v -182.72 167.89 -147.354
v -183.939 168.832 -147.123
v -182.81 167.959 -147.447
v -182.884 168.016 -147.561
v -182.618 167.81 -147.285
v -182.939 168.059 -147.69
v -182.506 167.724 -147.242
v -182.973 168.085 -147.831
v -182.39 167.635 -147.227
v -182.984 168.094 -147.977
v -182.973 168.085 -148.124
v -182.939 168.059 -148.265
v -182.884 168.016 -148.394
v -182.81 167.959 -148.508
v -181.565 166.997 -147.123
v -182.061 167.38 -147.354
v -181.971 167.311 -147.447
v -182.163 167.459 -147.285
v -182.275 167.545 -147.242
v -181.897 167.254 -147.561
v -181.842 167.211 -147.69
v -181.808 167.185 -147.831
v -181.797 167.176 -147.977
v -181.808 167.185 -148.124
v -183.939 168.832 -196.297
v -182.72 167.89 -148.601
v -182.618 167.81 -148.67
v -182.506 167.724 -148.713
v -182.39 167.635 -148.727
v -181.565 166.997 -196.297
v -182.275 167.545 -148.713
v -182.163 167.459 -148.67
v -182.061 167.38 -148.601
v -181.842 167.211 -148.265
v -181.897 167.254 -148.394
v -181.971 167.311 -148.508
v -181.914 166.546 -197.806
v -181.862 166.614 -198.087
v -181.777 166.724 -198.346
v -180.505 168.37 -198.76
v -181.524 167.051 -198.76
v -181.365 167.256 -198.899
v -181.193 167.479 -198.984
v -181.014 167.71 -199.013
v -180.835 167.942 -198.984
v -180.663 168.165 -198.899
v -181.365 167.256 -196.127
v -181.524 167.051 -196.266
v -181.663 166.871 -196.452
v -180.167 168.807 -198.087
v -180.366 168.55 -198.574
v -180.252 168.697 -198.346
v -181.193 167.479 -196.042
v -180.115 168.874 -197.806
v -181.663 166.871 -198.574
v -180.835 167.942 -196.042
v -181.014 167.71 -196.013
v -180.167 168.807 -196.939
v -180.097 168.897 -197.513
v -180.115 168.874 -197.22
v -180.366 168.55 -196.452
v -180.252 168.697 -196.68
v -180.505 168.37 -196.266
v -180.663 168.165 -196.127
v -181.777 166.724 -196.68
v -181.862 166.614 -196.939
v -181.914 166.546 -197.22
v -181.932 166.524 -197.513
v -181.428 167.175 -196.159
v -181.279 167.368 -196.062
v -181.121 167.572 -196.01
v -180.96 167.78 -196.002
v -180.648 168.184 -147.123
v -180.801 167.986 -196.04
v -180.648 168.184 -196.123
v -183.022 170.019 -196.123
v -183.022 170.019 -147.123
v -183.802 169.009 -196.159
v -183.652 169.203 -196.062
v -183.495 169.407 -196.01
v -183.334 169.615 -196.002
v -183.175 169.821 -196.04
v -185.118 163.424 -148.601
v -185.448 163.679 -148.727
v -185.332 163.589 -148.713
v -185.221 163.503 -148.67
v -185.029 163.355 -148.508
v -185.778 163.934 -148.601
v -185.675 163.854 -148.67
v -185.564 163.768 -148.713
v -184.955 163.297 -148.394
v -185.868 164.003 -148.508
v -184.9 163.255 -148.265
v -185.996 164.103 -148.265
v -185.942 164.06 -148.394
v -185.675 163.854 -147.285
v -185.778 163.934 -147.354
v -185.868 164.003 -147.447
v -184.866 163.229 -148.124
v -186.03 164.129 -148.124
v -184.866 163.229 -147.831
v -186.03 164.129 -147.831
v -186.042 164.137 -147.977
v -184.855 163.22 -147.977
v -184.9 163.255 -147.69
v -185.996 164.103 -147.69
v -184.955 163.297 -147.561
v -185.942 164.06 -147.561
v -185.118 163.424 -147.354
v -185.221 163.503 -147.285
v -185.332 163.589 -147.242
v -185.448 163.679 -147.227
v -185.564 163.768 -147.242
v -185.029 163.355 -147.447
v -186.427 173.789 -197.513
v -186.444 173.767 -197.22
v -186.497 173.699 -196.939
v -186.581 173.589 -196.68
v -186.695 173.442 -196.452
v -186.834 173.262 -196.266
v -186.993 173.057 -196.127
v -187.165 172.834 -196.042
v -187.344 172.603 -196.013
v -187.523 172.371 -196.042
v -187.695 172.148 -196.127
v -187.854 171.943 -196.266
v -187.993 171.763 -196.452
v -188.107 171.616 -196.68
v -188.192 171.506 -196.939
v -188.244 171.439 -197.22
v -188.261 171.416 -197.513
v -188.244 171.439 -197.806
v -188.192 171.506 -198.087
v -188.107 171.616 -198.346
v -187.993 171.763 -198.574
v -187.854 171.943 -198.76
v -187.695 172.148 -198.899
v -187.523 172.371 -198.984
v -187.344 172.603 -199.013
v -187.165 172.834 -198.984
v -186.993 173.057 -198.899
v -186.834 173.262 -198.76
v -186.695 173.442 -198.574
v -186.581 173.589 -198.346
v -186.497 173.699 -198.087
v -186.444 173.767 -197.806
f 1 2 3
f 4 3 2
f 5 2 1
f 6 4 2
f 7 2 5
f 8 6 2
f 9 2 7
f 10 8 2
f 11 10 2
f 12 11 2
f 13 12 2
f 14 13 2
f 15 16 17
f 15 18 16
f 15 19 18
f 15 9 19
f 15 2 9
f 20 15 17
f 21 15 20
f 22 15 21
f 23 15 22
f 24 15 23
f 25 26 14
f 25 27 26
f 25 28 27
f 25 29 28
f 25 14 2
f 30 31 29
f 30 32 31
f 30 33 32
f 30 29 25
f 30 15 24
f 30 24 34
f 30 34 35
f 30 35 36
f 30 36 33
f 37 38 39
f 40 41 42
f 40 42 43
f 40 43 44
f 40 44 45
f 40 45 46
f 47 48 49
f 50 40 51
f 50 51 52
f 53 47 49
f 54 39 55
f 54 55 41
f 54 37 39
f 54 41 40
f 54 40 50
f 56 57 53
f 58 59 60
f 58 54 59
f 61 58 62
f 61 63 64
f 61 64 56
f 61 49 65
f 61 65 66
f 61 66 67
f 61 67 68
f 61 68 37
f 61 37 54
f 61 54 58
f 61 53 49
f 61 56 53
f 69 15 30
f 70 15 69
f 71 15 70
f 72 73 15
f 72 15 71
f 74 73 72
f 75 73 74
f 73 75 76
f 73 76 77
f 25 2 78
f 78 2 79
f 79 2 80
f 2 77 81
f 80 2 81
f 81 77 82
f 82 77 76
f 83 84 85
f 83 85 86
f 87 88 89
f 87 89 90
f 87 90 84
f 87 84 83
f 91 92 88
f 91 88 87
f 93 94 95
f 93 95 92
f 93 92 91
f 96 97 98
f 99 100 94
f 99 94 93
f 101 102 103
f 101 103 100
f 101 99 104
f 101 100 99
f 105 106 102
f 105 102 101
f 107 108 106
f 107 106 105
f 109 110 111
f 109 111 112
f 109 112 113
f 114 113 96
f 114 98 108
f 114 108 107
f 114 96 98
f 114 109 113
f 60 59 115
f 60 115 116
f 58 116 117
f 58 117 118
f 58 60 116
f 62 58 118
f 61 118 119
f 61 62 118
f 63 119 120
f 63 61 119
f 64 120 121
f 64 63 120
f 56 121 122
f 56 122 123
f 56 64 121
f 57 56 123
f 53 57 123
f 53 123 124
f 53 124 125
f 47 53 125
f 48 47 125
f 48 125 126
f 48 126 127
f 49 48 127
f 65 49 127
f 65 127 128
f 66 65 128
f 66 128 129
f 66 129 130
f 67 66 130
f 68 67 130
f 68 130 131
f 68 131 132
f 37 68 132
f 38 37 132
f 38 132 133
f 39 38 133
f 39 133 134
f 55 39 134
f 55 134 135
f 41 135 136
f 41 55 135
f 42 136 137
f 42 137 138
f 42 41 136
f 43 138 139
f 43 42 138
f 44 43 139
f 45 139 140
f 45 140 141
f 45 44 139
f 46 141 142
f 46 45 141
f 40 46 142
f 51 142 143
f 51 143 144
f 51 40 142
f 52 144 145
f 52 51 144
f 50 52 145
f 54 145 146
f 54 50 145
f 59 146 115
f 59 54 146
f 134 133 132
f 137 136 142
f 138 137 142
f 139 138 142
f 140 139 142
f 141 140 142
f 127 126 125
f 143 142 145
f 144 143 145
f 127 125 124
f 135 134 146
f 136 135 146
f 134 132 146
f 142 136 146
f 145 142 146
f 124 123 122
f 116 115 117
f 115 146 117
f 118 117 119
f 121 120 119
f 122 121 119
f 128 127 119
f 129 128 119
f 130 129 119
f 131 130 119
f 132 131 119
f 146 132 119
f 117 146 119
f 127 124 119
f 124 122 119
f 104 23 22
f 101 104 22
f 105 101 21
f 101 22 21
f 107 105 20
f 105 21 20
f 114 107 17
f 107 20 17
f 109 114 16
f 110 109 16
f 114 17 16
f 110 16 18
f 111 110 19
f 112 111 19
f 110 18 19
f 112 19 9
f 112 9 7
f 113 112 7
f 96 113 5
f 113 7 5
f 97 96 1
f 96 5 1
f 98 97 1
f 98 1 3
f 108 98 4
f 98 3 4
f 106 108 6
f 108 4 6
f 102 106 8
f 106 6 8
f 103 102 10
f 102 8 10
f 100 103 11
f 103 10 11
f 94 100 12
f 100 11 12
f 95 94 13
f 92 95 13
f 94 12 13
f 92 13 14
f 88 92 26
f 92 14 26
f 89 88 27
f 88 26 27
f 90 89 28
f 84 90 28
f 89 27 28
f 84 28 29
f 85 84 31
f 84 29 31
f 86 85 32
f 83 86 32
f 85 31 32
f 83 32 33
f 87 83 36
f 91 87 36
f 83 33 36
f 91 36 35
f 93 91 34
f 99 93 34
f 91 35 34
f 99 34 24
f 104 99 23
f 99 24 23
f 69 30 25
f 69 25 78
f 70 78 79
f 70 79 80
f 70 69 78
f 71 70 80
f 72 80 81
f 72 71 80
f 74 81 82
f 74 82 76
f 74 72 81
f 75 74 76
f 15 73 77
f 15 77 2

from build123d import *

# Parameters (mm, degrees)
BOSS_EXTRUDE1_DEPTH = 5
BOSS_EXTRUDE2_START = 3
SKETCH1_3_R         = 1.5
BOSS_EXTRUDE2_DEPTH = 3
SKETCH2_R           = 0.75
BOSS_EXTRUDE3_DEPTH = 5


with BuildPart() as part:
    # Sketch1 → Boss-Extrude1 (new body)
    with BuildSketch(Plane(origin=(-196.842346713, 152.137054389, 0), x_dir=(0, 0, -1), z_dir=(0.7912235329674926, -0.6115270401858278, 0))):
        with BuildLine():
            ThreePointArc((196.313865969, 21.1), (197.988007446, 20.578495388), (199.012913027, 22.001269191))
            ThreePointArc((199.012913027, 22.001269191), (197.037818608, 23.424042993), (196.313865969, 21.1))
        make_face()
    extrude(amount=-BOSS_EXTRUDE1_DEPTH)

    # Sketch1<3> → Boss-Extrude2 (add)
    with BuildSketch(Plane(origin=(-196.842346713, 152.137054389, 0), x_dir=(0, 0, -1), z_dir=(0.7912235329674926, -0.6115270401858278, 0)).offset(BOSS_EXTRUDE2_START)):
        with BuildLine():
            ThreePointArc((196.297042618, 21.1), (196.00952923, 21.826729329), (196.122895609, 22.6))
            Line((196.122895609, 22.6), (147.122895609, 22.6))
            Line((147.122895609, 22.6), (147.122895609, 21.1))
            Line((147.122895609, 21.1), (196.297042618, 21.1))
        make_face()
        with Locations((197.512913027, 22.001269191)):
            Circle(SKETCH1_3_R)
    extrude(amount=-BOSS_EXTRUDE2_DEPTH)


with BuildPart() as boss_extrude2_piece_1:
    # of the separate pieces the step leaves, piece 1, a body of its own (boss_extrude2_pieces)
    add(part.part.solids().sort_by_distance((-181.565455567, 166.997289814, -147.122895609))[0])

    # Sketch2 → Boss-Extrude3 (add)
    with BuildSketch(Plane(origin=(12.903220548, 16.694816546, 0), x_dir=(0.7912235329674926, -0.6115270401858278, 0), z_dir=(-0.6115270401858278, -0.7912235329674926, 0))):
        with Locations((-246.824960676, -147.977498822)):
            Circle(SKETCH2_R)
    extrude(amount=BOSS_EXTRUDE3_DEPTH)


with BuildPart() as boss_extrude2_piece_2:
    # of the separate pieces the step leaves, piece 2, a body of its own (boss_extrude2_pieces)
    add(part.part.solids().sort_by_distance((-187.89524383, 171.889506136, -196.313865969))[0])


solid = Compound([boss_extrude2_piece_1.part, boss_extrude2_piece_2.part])
